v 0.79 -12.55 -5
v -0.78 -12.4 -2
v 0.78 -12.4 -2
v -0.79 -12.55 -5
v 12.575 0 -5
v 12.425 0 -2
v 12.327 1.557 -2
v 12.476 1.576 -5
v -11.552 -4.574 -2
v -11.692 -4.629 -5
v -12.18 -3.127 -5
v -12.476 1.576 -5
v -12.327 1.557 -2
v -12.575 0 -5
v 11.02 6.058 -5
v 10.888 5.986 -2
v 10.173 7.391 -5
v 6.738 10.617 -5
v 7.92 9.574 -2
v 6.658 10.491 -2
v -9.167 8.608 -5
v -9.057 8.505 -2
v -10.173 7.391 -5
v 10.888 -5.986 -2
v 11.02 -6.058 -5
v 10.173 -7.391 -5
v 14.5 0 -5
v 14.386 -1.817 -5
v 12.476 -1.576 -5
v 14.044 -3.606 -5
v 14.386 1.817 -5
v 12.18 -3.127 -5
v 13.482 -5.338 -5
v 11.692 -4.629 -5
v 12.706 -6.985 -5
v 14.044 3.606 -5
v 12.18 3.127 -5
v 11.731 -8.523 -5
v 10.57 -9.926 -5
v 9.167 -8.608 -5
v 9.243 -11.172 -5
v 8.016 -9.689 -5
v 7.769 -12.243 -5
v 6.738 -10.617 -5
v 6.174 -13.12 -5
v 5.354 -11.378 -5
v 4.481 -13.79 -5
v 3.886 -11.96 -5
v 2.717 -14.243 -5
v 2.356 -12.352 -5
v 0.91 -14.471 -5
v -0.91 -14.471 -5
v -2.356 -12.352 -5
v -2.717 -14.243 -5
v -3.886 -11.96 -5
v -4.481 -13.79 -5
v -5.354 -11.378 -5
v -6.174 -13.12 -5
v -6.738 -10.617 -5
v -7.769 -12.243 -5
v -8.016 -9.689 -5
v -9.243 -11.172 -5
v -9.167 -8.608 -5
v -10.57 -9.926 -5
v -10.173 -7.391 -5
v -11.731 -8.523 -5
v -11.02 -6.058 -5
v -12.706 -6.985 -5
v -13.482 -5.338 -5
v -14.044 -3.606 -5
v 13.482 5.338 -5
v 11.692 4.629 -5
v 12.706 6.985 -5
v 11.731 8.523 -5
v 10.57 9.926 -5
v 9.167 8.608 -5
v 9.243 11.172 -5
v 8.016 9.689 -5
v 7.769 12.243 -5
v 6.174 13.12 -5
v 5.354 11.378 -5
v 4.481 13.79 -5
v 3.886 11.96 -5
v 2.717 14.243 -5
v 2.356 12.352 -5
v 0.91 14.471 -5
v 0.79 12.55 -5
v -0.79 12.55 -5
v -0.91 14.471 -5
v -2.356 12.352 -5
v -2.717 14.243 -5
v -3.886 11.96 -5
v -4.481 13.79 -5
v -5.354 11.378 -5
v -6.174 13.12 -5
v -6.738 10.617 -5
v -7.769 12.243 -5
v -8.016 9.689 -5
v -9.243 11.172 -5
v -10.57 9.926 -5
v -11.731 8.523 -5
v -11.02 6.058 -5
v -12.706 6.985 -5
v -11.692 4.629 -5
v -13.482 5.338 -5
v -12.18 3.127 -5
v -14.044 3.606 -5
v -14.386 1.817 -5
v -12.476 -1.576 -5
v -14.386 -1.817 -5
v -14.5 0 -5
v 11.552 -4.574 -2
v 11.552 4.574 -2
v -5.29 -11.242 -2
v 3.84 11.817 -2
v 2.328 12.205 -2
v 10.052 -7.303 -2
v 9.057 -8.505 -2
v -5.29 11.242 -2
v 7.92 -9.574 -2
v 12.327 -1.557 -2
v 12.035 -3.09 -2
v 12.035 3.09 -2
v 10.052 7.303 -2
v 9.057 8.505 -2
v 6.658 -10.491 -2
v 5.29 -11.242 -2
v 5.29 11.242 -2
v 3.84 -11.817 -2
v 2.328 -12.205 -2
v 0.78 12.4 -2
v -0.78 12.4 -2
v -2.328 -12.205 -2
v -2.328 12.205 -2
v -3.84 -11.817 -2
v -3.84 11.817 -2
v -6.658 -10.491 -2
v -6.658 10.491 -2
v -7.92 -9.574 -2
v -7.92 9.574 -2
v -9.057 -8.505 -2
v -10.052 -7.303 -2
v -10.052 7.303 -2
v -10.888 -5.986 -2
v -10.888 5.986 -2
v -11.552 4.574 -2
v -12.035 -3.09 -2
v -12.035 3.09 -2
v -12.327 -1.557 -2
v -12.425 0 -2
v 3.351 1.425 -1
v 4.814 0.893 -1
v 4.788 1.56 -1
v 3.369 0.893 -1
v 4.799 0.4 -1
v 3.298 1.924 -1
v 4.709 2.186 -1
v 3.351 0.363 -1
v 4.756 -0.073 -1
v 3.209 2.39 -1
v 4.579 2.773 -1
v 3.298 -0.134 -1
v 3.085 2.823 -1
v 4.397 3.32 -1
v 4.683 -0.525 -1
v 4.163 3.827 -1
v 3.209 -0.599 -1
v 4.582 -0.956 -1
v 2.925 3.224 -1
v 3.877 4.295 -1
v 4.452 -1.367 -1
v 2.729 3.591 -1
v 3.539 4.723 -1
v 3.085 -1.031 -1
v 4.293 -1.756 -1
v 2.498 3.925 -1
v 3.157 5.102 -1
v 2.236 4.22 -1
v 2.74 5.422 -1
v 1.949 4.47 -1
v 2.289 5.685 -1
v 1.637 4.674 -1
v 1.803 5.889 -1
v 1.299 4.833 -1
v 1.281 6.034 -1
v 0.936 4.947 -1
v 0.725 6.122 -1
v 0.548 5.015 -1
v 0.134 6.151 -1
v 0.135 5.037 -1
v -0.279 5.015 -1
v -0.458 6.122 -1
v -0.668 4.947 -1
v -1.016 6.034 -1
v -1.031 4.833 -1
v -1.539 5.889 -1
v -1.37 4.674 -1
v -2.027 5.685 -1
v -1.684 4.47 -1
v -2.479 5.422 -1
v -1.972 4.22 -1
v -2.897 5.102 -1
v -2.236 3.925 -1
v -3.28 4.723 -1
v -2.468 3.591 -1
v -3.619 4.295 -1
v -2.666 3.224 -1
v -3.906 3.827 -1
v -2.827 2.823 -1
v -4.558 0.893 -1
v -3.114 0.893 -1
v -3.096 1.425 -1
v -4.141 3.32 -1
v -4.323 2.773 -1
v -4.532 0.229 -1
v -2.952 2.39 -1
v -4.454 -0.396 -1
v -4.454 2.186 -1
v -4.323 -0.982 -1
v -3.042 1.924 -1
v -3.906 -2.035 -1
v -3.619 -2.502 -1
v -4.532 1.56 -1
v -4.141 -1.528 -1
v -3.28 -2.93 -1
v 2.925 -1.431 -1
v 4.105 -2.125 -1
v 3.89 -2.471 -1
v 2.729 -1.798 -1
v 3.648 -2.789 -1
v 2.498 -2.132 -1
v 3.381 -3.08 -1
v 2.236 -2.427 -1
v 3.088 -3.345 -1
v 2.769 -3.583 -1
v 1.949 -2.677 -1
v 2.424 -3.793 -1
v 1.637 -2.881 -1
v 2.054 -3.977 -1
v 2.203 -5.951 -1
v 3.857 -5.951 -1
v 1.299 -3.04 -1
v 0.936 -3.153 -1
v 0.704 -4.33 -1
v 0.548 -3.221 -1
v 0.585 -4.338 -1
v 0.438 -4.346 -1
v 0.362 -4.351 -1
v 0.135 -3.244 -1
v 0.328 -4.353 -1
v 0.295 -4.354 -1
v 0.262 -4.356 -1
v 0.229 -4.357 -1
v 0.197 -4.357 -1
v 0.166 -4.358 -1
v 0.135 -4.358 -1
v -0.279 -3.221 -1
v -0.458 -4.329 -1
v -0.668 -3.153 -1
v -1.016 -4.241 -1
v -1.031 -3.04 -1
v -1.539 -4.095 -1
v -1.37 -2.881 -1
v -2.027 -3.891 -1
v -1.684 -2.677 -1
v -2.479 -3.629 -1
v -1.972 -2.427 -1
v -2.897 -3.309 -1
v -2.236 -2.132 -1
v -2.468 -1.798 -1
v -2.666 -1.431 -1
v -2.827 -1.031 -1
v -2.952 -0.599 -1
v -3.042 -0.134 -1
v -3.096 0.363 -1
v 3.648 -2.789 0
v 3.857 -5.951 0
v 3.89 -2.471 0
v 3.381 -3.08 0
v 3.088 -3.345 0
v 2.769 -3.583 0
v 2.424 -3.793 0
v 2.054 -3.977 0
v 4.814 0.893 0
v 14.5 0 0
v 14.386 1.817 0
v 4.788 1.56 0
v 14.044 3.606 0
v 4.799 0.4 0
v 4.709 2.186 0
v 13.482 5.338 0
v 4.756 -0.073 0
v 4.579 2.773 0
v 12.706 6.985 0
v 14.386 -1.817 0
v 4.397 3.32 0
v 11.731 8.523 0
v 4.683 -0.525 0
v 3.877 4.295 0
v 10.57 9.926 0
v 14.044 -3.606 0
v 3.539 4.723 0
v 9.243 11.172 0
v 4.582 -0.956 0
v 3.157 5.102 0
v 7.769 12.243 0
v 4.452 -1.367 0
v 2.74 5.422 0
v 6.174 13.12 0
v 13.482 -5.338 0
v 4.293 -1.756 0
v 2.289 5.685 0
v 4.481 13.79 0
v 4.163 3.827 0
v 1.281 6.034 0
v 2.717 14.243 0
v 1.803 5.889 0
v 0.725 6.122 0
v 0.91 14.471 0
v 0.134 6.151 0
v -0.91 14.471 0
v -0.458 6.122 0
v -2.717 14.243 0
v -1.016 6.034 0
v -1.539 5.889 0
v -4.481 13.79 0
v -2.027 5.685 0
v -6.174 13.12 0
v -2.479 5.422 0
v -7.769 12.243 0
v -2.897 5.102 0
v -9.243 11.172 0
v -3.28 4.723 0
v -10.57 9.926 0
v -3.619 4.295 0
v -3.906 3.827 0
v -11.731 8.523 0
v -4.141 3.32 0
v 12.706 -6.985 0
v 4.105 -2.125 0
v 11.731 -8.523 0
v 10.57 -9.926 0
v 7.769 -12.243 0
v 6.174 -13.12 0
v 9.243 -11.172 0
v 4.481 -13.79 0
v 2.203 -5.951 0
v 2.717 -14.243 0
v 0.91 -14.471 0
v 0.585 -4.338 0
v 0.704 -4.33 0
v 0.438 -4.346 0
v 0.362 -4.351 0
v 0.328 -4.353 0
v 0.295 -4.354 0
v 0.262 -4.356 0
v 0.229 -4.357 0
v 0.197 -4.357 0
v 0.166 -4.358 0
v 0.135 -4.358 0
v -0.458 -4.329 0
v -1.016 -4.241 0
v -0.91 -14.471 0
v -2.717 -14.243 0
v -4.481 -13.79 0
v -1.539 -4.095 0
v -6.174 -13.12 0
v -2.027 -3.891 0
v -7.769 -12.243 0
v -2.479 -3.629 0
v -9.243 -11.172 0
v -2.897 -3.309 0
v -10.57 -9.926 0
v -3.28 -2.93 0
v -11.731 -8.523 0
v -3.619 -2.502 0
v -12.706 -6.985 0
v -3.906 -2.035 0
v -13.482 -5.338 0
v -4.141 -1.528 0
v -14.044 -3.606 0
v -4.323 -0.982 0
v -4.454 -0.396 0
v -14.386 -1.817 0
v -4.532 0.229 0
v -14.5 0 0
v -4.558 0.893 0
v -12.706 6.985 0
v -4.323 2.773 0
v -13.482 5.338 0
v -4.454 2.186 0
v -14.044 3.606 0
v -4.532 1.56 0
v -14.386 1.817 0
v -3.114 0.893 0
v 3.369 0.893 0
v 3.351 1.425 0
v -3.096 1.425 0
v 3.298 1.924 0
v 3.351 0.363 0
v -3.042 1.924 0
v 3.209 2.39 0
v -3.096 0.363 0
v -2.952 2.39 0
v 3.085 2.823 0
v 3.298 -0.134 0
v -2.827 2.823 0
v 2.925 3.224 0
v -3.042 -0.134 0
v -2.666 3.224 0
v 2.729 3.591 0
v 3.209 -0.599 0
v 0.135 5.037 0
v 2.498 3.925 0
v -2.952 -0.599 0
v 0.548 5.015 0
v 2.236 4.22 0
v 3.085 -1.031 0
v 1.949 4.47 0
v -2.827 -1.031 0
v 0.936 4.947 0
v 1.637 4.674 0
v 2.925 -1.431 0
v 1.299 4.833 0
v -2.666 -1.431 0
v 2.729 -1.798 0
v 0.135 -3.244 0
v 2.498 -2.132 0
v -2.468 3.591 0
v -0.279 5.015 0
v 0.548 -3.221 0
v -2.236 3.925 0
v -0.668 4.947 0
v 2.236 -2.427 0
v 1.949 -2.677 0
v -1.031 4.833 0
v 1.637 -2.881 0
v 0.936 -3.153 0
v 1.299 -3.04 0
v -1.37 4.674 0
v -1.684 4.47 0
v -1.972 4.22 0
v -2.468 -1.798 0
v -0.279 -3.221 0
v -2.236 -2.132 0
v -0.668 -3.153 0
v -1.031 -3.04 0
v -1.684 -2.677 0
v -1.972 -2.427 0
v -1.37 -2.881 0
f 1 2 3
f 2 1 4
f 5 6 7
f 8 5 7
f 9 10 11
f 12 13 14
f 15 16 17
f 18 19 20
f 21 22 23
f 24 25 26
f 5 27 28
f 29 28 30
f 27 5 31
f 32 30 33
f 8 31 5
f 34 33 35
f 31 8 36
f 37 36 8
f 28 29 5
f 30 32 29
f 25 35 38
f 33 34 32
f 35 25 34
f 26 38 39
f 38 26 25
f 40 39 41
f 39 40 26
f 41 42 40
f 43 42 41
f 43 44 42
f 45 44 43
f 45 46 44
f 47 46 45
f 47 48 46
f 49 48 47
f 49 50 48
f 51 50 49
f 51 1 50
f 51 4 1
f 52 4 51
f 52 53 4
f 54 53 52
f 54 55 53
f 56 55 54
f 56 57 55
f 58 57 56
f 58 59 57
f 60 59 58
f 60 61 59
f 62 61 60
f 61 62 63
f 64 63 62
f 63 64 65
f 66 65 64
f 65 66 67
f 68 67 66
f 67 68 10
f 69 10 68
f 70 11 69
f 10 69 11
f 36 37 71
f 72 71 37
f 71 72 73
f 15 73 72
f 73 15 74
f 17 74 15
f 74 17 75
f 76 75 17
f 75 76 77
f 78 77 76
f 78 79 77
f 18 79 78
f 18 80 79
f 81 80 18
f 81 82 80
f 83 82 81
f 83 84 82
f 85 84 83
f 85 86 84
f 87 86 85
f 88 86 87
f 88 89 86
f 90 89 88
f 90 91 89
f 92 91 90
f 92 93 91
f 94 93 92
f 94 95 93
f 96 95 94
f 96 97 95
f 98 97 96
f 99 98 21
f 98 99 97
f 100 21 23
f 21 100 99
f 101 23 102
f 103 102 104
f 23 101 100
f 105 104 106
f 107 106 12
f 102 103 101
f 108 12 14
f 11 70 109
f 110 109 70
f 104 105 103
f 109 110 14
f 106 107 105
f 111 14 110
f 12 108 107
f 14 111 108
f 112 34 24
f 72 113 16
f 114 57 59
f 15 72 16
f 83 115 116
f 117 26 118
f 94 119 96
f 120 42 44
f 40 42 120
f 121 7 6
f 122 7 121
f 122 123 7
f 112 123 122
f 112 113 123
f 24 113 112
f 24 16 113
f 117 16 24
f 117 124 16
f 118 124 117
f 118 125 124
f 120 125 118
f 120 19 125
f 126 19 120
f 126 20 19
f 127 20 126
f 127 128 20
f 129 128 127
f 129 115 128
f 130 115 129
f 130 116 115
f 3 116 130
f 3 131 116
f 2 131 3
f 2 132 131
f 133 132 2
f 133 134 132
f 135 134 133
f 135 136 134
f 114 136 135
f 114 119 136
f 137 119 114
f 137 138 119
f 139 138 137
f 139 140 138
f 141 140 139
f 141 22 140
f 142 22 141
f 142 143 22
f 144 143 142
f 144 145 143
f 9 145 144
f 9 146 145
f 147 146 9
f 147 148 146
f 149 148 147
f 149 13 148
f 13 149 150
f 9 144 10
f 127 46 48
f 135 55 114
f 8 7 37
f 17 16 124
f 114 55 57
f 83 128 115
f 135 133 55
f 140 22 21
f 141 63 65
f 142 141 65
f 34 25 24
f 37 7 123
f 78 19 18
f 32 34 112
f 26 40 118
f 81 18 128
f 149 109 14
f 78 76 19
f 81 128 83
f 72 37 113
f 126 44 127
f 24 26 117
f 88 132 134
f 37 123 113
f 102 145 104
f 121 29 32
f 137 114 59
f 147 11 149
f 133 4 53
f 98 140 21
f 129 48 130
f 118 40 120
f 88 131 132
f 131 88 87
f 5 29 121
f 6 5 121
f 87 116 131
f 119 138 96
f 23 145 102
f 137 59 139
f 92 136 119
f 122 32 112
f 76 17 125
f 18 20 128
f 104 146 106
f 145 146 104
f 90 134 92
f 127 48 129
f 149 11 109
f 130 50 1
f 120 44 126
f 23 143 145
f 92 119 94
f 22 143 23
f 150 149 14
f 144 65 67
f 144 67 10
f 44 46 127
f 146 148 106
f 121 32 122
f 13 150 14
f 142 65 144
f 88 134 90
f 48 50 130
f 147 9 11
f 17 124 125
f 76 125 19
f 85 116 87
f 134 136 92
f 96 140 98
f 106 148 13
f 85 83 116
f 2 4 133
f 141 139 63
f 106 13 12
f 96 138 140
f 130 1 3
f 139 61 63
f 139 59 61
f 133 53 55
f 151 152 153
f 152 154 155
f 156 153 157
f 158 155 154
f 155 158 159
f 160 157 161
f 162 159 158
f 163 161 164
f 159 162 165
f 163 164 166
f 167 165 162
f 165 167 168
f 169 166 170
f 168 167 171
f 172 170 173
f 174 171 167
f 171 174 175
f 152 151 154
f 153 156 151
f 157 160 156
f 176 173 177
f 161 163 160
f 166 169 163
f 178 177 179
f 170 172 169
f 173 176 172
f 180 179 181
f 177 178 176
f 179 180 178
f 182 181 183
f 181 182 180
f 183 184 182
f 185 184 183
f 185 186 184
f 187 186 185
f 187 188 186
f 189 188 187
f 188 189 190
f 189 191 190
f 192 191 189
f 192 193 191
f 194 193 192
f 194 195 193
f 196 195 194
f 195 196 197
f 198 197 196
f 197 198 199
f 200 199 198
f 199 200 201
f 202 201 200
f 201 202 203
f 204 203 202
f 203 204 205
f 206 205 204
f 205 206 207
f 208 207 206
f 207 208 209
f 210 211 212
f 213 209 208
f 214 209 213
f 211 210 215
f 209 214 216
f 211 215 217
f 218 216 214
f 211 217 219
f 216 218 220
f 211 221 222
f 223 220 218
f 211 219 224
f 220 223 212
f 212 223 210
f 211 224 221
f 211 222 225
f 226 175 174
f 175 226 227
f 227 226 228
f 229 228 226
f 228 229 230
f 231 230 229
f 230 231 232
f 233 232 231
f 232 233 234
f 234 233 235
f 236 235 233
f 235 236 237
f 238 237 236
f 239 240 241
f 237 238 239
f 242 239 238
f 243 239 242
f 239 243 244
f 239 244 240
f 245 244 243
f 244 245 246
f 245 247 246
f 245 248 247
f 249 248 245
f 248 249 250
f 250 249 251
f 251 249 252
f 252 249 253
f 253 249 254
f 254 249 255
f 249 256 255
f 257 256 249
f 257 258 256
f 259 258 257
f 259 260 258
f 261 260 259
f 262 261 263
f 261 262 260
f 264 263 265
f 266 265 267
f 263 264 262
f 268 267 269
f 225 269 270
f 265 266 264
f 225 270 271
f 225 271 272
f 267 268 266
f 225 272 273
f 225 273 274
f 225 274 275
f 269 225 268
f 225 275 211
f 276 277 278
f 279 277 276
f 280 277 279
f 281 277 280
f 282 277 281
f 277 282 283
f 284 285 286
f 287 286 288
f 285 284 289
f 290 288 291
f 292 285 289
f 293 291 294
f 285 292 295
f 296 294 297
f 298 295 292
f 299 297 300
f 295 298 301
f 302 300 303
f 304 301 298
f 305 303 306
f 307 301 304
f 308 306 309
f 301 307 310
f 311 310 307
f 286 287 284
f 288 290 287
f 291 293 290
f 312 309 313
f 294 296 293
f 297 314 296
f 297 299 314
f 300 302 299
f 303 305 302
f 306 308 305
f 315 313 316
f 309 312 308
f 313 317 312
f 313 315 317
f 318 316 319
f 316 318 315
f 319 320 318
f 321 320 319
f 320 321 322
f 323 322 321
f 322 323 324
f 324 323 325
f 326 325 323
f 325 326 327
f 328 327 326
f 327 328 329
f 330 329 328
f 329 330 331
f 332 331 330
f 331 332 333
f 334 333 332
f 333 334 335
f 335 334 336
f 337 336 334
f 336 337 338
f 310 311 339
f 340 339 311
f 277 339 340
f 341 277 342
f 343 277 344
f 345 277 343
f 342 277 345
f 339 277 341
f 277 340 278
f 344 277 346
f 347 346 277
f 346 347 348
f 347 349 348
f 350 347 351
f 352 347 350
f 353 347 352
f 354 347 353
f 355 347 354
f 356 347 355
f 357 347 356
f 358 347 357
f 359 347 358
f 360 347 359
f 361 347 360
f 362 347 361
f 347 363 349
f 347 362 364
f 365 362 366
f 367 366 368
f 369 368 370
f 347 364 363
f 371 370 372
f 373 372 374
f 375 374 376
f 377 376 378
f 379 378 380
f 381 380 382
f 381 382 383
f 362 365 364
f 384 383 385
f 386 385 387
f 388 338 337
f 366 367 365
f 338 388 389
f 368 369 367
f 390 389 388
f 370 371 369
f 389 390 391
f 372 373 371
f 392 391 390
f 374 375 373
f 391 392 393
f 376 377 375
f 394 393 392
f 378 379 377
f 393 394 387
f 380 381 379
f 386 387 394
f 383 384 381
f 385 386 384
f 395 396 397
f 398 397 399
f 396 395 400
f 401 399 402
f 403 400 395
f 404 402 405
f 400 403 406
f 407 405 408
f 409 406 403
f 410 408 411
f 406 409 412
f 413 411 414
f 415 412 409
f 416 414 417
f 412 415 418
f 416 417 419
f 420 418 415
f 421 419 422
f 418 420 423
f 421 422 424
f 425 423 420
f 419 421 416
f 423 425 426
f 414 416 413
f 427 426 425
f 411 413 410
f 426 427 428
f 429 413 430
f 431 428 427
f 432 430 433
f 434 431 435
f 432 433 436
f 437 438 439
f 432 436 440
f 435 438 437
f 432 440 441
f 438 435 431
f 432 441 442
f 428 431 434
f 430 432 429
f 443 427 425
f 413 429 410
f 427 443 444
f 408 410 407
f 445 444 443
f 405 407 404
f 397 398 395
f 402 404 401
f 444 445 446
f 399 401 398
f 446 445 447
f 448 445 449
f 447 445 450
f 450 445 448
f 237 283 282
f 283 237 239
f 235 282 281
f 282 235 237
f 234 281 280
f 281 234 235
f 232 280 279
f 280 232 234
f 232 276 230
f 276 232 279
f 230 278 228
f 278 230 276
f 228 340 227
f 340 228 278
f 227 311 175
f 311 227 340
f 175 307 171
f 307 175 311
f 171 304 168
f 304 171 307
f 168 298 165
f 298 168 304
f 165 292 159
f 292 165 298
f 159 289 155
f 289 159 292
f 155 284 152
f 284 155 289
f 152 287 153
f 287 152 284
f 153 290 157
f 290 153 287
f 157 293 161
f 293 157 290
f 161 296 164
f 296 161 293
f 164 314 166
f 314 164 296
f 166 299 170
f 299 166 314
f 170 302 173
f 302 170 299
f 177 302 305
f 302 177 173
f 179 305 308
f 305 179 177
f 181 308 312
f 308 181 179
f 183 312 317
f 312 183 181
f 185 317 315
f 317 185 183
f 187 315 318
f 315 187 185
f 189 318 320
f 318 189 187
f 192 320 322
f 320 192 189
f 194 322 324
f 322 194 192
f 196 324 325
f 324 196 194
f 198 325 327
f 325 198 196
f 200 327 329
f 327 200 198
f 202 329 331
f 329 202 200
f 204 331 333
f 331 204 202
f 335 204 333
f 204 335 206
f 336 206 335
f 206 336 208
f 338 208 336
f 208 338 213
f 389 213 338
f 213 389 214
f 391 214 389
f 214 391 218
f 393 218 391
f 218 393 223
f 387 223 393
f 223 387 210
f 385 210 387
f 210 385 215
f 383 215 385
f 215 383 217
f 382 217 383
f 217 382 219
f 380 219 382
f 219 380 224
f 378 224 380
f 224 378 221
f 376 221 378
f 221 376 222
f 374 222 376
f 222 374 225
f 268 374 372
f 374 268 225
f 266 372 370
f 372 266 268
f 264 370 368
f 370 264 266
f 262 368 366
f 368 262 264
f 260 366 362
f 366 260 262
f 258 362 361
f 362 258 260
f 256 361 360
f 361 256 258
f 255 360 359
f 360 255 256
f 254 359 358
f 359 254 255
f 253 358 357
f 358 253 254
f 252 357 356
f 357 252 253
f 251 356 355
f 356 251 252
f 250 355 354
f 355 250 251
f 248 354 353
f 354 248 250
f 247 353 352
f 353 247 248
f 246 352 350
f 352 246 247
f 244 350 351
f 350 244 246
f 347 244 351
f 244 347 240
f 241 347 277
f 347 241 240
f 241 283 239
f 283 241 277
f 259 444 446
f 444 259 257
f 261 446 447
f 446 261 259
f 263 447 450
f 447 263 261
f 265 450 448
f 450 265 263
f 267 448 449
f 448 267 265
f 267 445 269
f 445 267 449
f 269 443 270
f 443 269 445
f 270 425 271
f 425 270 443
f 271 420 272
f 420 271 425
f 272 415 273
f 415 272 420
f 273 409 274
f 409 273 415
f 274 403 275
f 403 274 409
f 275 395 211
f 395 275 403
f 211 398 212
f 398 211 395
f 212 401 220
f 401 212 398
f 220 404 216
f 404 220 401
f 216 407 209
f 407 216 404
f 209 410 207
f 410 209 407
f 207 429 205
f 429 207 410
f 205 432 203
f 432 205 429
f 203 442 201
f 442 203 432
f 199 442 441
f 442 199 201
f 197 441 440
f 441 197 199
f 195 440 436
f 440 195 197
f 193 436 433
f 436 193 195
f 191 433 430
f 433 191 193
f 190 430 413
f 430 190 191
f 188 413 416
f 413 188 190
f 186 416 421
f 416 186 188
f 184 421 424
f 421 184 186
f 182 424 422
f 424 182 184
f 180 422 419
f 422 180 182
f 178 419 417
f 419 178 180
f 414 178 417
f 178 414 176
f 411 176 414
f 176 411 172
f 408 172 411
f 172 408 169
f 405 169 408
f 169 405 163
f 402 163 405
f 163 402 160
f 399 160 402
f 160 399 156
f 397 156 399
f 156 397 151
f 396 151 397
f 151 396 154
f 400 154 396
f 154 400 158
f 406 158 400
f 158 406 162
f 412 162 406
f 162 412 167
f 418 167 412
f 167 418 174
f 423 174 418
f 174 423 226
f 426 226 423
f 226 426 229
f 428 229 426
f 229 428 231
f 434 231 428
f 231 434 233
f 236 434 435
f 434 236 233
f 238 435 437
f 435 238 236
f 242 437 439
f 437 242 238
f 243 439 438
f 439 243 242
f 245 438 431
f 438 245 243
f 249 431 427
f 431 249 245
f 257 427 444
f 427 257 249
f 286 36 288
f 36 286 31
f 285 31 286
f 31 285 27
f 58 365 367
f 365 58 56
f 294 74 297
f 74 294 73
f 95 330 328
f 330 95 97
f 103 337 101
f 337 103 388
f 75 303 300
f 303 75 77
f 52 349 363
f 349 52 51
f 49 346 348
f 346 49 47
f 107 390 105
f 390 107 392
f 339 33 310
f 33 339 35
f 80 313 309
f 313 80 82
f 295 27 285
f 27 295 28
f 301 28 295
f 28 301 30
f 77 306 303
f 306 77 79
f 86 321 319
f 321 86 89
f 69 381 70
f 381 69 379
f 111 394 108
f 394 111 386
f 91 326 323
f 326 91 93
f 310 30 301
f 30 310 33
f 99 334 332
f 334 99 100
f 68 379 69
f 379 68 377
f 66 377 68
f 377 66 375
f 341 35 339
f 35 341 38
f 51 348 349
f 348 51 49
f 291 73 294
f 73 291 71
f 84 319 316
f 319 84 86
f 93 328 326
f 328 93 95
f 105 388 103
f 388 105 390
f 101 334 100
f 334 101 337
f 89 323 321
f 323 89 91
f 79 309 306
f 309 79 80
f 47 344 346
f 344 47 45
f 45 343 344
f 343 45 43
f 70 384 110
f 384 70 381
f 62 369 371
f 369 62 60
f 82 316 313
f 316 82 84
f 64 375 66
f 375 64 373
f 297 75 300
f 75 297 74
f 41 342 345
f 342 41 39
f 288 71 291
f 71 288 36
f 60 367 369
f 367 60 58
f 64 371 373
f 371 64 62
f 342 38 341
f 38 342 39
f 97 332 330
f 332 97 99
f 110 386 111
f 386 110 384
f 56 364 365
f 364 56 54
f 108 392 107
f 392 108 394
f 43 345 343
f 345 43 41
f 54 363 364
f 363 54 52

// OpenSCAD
$fn = 50;


difference() {
	union() {
		translate(v = [0, 0, -5.0000000000]) {
			cylinder(h = 5, r = 14.5000000000);
		}
	}
	union() {
		#translate(v = [0, 0, -5.0000000000]) {
			cylinder(h = 3, r1 = 12.5750000000, r2 = 12.4250000000);
		}
		translate(v = [0, 0, -1]) {
			linear_extrude(height = 1) {
				text(font = "Impact", halign = "center", size = 10, text = "Q", valign = "center");
			}
		}
	}
}
